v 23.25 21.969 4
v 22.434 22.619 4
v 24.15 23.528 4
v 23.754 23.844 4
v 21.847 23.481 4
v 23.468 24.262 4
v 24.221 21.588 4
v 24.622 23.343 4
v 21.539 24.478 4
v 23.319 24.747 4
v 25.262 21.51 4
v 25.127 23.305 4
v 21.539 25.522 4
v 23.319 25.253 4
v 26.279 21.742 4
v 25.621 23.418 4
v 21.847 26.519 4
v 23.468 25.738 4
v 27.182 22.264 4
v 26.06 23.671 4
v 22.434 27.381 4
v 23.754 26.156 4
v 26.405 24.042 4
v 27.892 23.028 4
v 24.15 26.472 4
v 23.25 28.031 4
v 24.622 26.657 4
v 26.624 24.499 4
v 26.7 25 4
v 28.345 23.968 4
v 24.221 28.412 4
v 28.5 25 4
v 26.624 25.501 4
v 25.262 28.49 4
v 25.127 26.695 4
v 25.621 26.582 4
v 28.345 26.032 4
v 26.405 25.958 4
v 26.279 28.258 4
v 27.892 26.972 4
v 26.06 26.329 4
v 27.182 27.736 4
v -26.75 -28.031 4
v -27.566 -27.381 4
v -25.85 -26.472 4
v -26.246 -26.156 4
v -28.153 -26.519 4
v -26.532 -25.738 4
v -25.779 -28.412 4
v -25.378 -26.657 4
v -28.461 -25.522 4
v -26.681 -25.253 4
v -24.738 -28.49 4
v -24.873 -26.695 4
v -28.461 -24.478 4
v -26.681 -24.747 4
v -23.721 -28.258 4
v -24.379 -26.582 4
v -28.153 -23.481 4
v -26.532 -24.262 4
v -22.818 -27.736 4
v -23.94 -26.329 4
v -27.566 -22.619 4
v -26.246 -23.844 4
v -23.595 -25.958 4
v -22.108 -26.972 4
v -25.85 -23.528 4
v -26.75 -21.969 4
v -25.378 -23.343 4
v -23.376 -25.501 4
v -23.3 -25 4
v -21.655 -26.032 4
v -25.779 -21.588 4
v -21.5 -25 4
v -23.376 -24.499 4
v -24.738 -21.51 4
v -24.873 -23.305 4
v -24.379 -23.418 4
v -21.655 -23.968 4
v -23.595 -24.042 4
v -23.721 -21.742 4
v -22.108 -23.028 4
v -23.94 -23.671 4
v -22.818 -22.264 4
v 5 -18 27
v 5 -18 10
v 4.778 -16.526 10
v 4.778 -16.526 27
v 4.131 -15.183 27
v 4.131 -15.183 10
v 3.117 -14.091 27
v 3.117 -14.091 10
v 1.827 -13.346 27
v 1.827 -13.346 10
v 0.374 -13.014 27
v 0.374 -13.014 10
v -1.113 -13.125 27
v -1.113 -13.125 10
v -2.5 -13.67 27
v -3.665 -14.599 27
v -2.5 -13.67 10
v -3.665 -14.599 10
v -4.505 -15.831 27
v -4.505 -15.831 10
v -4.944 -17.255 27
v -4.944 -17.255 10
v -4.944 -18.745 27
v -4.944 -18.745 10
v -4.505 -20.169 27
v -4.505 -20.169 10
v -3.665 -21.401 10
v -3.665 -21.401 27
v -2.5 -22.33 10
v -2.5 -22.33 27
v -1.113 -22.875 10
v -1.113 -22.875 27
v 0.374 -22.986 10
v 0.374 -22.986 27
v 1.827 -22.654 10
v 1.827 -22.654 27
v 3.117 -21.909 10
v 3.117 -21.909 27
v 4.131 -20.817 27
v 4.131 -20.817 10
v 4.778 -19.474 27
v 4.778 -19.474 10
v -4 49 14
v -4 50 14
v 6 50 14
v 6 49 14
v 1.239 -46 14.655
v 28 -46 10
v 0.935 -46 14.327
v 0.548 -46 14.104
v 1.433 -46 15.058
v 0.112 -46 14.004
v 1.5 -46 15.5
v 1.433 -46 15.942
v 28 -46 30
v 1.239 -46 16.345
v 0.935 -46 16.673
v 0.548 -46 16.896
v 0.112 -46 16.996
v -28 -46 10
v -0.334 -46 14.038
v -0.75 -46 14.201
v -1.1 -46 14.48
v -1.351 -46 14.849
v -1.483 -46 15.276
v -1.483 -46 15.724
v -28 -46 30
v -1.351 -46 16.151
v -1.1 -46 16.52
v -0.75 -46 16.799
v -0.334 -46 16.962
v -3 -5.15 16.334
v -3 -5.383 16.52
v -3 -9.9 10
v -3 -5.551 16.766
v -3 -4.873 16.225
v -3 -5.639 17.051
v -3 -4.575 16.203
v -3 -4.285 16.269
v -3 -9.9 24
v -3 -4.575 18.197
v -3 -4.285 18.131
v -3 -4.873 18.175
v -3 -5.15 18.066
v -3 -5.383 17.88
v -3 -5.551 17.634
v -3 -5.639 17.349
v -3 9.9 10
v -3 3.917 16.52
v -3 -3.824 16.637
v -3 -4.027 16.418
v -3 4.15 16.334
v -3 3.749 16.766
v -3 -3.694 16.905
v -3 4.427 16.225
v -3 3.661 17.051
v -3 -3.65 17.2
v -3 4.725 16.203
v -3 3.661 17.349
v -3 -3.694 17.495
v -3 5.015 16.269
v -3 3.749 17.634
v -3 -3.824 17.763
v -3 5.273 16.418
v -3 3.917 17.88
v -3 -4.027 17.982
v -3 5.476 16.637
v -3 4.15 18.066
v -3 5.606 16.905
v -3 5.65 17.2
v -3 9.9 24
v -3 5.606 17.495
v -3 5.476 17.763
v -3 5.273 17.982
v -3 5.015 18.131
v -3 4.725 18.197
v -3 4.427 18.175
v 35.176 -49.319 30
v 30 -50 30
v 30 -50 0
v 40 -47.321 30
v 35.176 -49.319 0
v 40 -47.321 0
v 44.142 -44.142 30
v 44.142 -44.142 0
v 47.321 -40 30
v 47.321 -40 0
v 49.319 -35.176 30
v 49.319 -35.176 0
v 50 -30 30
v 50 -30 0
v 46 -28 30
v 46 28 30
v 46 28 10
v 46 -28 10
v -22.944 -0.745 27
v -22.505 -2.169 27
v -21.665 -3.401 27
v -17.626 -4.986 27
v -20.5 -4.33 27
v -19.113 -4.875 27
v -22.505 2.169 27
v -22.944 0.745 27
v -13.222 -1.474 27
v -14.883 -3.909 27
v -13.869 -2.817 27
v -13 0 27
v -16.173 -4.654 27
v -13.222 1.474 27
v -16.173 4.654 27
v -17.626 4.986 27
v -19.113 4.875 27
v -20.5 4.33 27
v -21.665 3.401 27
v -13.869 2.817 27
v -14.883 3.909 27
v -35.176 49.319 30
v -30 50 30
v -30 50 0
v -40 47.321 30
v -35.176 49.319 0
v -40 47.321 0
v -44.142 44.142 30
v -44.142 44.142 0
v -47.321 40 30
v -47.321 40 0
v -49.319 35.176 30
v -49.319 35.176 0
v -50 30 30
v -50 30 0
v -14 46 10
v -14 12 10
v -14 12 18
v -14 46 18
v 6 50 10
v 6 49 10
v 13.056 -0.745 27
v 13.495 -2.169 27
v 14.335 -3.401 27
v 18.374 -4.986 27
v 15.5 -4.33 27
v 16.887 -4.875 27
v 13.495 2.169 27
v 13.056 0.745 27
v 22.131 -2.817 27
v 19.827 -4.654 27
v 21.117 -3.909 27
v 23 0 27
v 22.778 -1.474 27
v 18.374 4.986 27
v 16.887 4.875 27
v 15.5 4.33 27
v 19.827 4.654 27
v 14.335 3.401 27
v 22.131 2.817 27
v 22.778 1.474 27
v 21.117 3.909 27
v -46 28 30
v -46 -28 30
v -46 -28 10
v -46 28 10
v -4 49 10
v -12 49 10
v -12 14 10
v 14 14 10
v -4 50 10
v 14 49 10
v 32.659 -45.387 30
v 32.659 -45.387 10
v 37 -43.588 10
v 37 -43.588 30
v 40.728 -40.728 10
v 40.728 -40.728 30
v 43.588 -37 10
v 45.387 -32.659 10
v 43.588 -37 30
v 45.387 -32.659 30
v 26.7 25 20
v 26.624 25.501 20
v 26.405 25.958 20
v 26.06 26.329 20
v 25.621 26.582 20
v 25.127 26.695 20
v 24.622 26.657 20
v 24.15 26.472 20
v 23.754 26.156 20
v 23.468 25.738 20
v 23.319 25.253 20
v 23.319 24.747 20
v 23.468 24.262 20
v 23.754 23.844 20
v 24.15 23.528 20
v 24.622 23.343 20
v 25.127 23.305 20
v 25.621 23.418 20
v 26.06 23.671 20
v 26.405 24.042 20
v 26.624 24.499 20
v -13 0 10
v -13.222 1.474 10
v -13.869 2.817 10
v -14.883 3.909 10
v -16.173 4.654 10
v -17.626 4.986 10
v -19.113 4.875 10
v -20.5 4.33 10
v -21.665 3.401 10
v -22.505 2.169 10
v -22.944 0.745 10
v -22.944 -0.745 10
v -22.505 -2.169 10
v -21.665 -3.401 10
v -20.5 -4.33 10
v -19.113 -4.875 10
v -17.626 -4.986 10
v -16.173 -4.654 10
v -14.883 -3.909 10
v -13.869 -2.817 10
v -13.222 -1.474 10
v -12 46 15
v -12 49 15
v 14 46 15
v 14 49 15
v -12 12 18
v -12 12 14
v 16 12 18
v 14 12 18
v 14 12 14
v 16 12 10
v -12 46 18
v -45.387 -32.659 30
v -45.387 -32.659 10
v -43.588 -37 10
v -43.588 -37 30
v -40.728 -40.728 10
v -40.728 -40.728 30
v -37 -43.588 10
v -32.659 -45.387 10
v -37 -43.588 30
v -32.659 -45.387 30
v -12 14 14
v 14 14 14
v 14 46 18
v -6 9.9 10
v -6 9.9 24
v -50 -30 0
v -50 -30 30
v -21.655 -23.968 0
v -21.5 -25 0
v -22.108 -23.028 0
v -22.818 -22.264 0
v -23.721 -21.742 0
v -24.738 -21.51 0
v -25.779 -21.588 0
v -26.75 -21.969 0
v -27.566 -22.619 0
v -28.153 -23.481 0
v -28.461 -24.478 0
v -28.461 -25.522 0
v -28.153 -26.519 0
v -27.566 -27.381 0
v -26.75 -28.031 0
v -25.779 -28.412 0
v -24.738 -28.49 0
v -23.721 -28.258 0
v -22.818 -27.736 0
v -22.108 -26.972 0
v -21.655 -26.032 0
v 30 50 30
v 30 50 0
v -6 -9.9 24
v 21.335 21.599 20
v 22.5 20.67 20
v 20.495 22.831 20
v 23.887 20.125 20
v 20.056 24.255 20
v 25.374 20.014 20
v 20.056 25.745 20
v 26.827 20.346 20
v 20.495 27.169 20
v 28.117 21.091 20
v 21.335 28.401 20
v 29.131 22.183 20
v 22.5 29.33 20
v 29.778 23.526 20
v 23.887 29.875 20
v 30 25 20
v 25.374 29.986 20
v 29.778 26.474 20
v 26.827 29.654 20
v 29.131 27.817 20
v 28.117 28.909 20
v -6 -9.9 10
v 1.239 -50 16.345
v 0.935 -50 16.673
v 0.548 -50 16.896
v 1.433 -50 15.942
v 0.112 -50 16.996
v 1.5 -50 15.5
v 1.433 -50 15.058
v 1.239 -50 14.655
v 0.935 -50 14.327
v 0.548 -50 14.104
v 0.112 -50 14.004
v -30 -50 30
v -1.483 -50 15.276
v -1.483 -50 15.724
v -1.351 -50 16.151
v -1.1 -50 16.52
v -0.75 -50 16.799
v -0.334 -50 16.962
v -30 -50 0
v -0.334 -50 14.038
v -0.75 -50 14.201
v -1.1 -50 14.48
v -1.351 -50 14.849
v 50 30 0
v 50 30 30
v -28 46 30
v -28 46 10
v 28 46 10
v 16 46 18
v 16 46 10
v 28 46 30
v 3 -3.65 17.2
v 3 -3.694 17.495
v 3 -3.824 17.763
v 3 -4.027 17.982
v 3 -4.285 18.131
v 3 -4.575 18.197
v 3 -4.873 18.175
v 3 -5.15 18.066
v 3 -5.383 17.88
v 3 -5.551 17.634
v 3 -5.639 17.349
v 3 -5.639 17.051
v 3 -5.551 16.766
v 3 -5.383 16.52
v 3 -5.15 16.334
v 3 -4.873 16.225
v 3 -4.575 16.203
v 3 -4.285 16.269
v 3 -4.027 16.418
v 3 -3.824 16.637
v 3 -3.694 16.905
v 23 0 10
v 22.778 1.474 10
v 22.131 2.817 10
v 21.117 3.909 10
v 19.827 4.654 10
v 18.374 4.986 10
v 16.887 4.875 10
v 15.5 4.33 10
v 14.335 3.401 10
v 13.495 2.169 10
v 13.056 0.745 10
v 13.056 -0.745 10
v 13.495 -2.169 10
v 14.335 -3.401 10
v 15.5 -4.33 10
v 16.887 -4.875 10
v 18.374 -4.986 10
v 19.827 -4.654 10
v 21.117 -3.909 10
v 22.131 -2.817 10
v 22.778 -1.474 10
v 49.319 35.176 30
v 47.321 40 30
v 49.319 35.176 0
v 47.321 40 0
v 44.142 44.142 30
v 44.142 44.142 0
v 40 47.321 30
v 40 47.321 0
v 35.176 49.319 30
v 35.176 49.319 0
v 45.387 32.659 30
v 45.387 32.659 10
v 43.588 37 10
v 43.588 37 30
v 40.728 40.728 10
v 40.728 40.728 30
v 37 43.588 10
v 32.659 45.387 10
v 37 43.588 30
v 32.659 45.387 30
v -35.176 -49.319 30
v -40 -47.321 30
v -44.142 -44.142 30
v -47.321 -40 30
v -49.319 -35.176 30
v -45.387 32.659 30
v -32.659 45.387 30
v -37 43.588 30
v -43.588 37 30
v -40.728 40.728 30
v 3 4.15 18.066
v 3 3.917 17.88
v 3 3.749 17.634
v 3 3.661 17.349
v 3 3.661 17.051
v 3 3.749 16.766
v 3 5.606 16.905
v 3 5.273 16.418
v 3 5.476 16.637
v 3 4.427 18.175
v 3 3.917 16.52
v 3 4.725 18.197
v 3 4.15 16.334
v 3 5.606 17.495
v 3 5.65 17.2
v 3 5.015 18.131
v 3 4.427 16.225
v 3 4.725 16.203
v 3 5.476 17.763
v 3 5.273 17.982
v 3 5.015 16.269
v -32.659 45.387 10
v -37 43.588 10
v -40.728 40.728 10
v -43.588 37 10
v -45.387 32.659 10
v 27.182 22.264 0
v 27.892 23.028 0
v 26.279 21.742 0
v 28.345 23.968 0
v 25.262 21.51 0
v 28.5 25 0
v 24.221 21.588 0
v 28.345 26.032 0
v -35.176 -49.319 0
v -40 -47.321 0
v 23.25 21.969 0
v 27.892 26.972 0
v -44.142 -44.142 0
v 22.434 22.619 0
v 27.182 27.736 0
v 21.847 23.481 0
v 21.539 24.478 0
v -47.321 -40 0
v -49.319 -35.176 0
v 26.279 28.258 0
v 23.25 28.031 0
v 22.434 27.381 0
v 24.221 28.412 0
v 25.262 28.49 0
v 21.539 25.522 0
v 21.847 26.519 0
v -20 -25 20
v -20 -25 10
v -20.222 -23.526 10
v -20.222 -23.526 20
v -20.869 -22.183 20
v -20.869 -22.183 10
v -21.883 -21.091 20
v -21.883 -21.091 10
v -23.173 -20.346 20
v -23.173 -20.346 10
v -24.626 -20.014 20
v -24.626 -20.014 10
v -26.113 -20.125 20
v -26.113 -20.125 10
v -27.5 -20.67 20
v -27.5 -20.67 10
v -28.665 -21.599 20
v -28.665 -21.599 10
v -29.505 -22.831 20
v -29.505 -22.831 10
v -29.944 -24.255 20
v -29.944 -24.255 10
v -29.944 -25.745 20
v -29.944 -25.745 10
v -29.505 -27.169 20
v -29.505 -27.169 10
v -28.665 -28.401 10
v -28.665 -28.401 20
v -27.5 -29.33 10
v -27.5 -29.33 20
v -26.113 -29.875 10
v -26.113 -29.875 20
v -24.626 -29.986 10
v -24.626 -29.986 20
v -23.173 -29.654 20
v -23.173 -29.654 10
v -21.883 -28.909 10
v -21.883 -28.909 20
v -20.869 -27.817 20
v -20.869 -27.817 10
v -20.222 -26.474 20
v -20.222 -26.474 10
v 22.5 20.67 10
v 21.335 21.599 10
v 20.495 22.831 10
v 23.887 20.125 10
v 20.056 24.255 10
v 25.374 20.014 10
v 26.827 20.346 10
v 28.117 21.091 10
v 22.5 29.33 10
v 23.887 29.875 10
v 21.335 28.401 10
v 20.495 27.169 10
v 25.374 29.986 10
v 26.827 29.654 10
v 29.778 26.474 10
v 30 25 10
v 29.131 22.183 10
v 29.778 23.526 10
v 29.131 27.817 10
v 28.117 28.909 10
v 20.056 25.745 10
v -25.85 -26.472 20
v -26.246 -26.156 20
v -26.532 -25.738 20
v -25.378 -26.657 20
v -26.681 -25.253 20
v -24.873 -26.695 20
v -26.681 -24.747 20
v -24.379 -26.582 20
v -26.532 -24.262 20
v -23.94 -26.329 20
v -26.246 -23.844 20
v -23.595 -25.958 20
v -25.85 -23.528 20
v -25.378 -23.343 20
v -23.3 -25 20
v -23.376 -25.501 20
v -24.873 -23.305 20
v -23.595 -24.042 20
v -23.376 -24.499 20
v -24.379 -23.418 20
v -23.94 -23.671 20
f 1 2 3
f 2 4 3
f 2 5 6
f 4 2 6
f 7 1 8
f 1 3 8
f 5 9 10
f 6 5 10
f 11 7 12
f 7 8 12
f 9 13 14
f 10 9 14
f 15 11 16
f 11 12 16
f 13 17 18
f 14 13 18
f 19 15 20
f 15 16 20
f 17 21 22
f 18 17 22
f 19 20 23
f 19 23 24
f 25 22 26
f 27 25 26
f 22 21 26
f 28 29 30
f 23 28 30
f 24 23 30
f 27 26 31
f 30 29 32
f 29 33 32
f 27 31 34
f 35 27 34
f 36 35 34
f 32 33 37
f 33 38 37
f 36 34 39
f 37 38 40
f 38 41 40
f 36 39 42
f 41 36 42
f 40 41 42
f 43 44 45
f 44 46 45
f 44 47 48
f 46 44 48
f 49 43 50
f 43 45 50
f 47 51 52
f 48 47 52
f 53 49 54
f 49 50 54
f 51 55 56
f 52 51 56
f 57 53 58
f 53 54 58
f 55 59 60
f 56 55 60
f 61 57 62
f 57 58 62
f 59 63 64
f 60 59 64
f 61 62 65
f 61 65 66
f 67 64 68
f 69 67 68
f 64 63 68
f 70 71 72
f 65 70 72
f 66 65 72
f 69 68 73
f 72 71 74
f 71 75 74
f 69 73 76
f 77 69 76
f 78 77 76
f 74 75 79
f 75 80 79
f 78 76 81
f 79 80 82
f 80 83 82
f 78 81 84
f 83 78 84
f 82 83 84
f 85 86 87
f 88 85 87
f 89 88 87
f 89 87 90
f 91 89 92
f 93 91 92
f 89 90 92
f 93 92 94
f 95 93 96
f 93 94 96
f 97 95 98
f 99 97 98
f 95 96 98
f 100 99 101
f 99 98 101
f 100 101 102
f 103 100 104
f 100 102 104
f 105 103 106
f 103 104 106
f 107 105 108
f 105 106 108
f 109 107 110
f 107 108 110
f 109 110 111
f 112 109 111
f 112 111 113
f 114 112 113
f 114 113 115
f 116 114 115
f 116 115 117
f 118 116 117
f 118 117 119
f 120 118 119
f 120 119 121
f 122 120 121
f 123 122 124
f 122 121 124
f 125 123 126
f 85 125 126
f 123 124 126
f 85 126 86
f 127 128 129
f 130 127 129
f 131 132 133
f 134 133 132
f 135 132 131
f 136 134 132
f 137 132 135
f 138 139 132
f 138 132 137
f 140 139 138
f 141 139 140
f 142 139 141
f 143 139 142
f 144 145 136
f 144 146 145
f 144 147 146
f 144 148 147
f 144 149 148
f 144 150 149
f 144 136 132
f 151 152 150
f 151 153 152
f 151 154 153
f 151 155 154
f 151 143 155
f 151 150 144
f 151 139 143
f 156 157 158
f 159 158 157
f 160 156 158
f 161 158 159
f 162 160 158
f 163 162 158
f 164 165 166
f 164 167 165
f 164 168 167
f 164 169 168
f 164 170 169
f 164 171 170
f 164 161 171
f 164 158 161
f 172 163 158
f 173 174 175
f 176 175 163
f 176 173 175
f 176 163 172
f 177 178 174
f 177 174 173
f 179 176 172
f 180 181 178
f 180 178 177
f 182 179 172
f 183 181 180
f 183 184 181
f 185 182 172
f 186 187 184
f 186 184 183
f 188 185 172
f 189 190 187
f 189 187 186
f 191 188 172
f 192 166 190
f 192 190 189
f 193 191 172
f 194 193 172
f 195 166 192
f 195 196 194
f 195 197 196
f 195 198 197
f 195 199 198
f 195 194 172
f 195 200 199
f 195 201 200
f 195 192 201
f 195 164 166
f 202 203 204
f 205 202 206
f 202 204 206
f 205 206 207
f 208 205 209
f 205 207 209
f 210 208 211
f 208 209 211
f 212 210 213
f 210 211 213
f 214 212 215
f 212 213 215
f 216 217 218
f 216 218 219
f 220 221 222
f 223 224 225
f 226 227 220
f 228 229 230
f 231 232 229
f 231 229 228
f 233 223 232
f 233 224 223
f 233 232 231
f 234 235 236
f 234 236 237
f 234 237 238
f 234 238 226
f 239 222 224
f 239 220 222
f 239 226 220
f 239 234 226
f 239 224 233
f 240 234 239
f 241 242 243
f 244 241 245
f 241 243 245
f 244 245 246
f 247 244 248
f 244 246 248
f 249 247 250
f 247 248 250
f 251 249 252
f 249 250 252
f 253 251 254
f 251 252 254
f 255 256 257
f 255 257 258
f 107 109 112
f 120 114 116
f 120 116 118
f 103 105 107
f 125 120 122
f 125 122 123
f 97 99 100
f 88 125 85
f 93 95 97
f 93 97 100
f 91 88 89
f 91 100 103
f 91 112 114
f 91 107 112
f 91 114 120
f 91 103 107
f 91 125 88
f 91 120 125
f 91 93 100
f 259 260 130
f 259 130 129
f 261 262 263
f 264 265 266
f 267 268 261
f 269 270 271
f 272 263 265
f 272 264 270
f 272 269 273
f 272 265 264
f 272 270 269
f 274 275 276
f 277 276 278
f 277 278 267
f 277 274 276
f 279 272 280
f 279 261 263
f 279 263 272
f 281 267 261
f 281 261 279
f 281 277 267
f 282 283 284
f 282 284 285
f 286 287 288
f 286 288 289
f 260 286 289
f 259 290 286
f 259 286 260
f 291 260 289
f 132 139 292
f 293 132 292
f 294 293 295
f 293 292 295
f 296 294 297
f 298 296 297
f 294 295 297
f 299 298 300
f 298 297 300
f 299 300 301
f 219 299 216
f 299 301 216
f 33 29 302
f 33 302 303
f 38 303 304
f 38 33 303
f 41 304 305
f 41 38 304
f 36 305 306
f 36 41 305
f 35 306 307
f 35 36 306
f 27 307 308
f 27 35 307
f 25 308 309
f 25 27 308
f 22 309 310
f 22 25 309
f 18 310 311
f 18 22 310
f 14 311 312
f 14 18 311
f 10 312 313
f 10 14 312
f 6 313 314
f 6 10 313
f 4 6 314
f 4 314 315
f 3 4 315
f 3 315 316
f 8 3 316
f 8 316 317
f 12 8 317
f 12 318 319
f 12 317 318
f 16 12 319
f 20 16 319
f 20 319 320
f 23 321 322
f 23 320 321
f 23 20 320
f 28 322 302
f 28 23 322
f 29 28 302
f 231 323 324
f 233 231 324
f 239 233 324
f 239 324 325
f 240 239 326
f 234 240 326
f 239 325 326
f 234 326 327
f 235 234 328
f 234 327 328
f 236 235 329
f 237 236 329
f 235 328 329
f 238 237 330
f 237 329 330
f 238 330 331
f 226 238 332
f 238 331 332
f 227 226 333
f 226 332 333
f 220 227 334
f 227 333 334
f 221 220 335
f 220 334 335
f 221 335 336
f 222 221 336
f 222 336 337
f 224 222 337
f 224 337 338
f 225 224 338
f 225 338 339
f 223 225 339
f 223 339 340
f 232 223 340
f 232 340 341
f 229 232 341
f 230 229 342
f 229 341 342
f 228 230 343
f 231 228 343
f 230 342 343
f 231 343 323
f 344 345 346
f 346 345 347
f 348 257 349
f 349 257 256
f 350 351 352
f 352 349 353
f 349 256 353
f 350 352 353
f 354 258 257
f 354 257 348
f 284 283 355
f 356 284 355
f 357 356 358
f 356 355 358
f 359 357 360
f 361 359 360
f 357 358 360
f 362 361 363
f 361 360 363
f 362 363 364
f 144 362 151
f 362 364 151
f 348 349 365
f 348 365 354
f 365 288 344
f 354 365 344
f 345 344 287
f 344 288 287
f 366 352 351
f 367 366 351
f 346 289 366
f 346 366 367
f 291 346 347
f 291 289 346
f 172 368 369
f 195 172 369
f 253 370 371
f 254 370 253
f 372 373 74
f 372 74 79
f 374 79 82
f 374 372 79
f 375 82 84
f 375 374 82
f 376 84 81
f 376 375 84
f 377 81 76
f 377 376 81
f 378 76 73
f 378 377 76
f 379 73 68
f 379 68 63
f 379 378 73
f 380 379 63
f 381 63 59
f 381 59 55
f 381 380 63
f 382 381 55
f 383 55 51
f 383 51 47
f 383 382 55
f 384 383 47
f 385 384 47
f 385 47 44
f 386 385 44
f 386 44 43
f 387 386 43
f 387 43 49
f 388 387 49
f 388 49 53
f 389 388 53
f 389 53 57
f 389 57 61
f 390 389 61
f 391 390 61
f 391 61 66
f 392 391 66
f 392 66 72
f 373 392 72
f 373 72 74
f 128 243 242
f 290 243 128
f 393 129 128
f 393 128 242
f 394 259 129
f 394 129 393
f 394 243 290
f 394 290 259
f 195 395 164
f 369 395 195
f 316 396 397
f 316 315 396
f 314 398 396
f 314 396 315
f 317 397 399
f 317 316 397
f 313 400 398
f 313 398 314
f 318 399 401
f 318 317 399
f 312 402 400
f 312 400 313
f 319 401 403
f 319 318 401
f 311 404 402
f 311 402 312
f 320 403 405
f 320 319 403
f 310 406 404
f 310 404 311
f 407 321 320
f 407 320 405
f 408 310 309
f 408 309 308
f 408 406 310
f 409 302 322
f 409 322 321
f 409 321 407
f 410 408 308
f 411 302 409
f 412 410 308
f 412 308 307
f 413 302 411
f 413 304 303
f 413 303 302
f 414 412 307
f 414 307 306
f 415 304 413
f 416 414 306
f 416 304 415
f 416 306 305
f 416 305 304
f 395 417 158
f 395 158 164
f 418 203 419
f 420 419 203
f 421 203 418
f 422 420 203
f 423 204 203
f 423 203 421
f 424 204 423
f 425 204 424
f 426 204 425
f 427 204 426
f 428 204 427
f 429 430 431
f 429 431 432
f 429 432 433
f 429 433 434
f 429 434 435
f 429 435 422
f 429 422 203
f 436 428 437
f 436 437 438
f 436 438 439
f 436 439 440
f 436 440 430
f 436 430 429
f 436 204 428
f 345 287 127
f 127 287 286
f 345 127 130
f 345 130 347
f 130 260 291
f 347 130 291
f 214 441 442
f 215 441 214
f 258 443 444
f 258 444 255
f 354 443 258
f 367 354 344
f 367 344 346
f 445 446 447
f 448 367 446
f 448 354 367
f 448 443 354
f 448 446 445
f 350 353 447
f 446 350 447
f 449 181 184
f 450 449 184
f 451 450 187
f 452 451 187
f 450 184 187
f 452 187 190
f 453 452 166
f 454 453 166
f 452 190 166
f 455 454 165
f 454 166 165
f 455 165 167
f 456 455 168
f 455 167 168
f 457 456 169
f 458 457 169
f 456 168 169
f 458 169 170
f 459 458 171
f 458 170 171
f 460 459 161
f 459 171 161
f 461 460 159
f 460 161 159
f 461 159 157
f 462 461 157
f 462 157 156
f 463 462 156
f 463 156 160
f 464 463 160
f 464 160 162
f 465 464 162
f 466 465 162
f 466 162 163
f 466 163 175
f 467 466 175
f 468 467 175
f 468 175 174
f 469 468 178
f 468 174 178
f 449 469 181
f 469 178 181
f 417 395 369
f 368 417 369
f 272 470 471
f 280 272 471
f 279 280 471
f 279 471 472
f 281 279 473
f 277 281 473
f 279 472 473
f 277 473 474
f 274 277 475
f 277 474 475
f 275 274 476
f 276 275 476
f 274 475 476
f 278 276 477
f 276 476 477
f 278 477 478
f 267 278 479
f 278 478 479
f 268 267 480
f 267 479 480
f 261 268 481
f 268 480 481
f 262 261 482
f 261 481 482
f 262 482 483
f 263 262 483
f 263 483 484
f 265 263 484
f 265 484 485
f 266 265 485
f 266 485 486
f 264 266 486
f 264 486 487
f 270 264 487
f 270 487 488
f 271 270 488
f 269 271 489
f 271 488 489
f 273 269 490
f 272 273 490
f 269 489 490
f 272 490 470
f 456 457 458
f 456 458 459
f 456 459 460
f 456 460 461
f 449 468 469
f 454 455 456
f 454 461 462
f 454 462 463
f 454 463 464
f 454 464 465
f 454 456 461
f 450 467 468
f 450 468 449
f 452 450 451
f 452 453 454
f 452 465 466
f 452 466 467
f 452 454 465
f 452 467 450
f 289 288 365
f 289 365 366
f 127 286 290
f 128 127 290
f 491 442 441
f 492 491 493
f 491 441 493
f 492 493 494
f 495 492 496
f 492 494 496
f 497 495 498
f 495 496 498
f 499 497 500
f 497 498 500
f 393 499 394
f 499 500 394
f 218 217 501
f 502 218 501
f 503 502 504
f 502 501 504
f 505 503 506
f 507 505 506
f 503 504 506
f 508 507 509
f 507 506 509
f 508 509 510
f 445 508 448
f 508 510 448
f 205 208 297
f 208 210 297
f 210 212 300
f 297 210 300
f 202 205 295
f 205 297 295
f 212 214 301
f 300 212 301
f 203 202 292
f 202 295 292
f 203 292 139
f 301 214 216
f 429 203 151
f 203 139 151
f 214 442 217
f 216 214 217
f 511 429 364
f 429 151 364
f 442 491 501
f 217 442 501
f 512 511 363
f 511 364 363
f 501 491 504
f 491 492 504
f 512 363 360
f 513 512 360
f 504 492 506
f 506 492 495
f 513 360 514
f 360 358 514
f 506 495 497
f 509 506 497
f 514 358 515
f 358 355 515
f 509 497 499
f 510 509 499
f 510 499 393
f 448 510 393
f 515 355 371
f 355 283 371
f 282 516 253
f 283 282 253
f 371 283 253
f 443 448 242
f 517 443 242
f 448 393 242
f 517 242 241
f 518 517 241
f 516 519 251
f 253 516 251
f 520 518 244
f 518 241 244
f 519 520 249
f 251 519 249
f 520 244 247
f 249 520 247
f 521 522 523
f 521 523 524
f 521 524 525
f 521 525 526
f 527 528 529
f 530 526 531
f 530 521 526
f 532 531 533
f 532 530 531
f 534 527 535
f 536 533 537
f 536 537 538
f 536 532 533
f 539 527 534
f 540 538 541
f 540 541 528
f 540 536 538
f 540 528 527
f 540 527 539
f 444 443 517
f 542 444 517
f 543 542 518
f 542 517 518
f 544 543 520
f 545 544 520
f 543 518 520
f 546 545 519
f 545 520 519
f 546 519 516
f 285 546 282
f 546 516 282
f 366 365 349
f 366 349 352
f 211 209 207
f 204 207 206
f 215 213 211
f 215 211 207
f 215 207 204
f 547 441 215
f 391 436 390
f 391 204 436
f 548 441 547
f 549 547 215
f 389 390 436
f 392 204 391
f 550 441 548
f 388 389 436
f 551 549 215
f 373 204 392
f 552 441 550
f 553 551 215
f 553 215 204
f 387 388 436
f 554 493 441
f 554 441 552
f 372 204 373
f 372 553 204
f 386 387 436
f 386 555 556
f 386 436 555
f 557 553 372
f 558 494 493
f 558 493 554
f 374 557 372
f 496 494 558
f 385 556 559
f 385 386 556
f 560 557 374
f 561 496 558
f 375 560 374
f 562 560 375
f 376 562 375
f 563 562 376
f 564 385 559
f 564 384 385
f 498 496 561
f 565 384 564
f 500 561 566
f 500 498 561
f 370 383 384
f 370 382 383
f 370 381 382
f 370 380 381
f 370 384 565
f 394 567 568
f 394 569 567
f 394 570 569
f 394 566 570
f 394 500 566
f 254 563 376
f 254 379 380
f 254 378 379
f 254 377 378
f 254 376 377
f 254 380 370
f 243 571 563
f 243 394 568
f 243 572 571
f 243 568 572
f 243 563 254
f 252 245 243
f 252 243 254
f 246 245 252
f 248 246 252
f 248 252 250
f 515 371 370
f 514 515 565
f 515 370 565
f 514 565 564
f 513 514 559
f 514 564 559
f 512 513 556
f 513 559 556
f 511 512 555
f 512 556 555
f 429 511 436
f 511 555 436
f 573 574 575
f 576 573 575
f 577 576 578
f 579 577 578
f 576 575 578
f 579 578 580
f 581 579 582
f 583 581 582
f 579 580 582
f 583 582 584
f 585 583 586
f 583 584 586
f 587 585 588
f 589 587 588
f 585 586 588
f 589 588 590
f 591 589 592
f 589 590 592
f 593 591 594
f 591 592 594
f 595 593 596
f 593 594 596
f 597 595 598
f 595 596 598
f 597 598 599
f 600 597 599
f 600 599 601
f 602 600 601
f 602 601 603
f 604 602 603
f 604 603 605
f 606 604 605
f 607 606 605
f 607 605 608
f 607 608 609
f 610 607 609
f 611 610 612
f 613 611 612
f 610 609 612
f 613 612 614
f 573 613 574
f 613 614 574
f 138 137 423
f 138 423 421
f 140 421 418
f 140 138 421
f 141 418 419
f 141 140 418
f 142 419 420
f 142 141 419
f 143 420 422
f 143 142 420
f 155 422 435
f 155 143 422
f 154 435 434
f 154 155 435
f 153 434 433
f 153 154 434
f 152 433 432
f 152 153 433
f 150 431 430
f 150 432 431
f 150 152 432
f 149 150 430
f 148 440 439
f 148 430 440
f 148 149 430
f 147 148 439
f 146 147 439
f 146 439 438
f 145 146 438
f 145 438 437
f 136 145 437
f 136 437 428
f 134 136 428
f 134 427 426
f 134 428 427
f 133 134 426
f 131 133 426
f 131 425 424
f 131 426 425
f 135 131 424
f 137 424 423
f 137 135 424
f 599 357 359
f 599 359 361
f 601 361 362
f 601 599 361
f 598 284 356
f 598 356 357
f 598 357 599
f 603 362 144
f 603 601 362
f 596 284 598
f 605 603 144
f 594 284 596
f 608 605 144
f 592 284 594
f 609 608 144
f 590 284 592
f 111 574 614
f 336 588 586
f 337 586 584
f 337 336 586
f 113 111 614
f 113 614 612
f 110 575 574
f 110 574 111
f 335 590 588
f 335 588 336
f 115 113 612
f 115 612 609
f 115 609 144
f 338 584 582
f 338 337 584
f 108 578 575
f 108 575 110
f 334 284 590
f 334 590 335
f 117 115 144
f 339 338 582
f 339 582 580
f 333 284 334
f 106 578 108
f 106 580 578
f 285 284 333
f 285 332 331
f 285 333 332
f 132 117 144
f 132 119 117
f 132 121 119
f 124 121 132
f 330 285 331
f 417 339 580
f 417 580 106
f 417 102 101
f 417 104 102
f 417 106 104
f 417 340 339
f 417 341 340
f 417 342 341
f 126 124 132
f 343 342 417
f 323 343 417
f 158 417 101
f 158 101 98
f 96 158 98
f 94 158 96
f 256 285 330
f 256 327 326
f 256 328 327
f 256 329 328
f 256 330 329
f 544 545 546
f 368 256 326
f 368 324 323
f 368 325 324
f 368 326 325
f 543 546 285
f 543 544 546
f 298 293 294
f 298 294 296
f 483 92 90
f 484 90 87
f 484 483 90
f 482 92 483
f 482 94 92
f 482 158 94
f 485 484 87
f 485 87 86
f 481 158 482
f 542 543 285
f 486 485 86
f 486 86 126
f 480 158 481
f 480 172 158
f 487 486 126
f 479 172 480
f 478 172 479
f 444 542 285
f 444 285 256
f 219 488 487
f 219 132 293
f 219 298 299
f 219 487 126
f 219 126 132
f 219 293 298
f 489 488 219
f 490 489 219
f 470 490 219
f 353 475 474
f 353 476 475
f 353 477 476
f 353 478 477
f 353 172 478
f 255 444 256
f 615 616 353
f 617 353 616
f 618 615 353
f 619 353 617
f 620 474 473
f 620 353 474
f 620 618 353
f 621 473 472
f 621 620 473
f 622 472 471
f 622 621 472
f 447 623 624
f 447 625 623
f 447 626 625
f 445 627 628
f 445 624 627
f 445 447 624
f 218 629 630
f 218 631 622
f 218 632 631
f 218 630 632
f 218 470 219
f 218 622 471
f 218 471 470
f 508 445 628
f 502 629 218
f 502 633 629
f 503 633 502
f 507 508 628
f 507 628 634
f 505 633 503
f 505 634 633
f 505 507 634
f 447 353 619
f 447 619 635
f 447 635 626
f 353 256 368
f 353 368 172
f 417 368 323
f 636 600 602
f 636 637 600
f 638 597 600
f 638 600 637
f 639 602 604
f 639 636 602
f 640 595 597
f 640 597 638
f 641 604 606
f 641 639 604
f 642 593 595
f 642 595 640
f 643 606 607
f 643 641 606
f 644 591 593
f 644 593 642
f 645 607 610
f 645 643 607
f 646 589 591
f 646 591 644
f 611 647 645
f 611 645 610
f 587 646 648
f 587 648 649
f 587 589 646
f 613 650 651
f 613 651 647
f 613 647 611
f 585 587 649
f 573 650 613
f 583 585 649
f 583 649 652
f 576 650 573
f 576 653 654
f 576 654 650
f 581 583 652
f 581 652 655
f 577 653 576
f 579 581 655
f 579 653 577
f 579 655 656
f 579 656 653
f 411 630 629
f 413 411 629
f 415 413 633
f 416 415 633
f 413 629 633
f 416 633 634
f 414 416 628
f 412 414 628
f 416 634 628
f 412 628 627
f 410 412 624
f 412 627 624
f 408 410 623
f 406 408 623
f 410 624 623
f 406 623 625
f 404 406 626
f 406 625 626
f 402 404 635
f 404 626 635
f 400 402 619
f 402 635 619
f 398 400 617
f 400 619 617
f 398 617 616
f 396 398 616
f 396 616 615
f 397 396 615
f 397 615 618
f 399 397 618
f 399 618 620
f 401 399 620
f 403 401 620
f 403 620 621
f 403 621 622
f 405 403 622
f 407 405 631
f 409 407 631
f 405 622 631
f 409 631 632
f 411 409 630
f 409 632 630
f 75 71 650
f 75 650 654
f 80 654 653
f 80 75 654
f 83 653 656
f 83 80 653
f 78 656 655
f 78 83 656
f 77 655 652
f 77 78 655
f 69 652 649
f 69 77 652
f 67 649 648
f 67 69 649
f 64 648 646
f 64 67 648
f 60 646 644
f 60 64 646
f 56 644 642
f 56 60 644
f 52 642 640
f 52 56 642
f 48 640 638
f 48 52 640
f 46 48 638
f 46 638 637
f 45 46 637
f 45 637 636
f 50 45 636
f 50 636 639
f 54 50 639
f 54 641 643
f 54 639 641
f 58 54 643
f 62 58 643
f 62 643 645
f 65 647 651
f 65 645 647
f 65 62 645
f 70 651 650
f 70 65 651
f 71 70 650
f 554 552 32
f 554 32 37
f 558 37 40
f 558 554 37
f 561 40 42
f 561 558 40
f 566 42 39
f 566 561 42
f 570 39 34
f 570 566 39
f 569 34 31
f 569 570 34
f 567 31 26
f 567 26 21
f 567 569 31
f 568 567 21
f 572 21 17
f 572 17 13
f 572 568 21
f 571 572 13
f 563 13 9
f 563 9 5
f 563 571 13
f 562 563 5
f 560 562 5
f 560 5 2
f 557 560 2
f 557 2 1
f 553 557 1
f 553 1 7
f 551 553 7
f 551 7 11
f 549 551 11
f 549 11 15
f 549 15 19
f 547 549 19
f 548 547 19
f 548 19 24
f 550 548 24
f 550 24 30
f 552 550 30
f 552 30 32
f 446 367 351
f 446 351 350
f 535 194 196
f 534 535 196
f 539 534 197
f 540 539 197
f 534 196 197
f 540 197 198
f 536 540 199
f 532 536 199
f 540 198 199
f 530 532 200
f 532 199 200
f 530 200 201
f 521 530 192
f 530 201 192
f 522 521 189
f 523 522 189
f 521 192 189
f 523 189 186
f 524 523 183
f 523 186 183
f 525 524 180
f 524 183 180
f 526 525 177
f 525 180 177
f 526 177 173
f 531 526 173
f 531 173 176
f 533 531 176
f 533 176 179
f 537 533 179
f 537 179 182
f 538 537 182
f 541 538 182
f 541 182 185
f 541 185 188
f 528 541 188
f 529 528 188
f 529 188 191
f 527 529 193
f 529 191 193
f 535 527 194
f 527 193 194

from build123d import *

# Parameters (mm, degrees)
CYLINDER009_R     = 1.5
CYLINDER009_DEPTH = 10
CYLINDER008_R     = 3.5
CYLINDER008_DEPTH = 8
CYLINDER006_R     = 1.7
CYLINDER006_DEPTH = 36
CYLINDER007_R     = 3.5
CYLINDER007_DEPTH = 8
CYLINDER005_R     = 1.7
CYLINDER005_DEPTH = 36
CYLINDER004_R     = 5
CYLINDER004_DEPTH = 10
CYLINDER003_R     = 5
CYLINDER003_DEPTH = 10
SKETCH002_W       = 19.8
SKETCH002_H       = 14
PAD001_DEPTH      = 3
SKETCH003_R       = 1
PAD002_DEPTH      = 6
CYLINDER_R        = 5
CYLINDER_DEPTH    = 17
CYLINDER001_R     = 5
CYLINDER001_DEPTH = 17
CYLINDER002_R     = 5
CYLINDER002_DEPTH = 17
BOX_W             = 2
BOX_H             = 34
BOX_DEPTH         = 10
BOX001_W          = 2
BOX001_H          = 34
BOX001_DEPTH      = 10
BOX004_W          = 30
BOX004_H          = 2
BOX004_DEPTH      = 6
BOX003_W          = 26
BOX003_H          = 10
BOX003_DEPTH      = 5
BOX002_W          = 10
BOX002_H          = 10
BOX002_DEPTH      = 4
PAD_DEPTH         = 30
POCKET_DEPTH      = 20


with BuildPart() as taladro_led:
    # Cylinder009 → Cylinder009 (new body)
    with BuildSketch(Plane(origin=(0, -44, 15.5), x_dir=(1, 0, 0), z_dir=(0, -1, 0))):
        Circle(CYLINDER009_R)
    extrude(amount=CYLINDER009_DEPTH)


with BuildPart() as cylinder008:
    # Cylinder008 → Cylinder008 (new body)
    with BuildSketch(Plane(origin=(25, 25, -4), x_dir=(1, 0, 0), z_dir=(0, 0, 1))):
        Circle(CYLINDER008_R)
    extrude(amount=CYLINDER008_DEPTH)


with BuildPart() as fusion002:
    # Cylinder006 → Cylinder006 (new body)
    with BuildSketch(Plane(origin=(25, 25, -4), x_dir=(1, 0, 0), z_dir=(0, 0, 1))):
        Circle(CYLINDER006_R)
    extrude(amount=CYLINDER006_DEPTH)

    # Fusion002: union Cylinder008
    add(cylinder008.part)


with BuildPart() as cylinder007:
    # Cylinder007 → Cylinder007 (new body)
    with BuildSketch(Plane(origin=(-25, -25, -4), x_dir=(1, 0, 0), z_dir=(0, 0, 1))):
        Circle(CYLINDER007_R)
    extrude(amount=CYLINDER007_DEPTH)


with BuildPart() as fusion001:
    # Cylinder005 → Cylinder005 (new body)
    with BuildSketch(Plane(origin=(-25, -25, -4), x_dir=(1, 0, 0), z_dir=(0, 0, 1))):
        Circle(CYLINDER005_R)
    extrude(amount=CYLINDER005_DEPTH)

    # Fusion001: union Cylinder007
    add(cylinder007.part)


with BuildPart() as cylinder004:
    # Cylinder004 → Cylinder004 (new body)
    with BuildSketch(Plane(origin=(25, 25, 10), x_dir=(1, 0, 0), z_dir=(0, 0, 1))):
        Circle(CYLINDER004_R)
    extrude(amount=CYLINDER004_DEPTH)


with BuildPart() as cylinder003:
    # Cylinder003 → Cylinder003 (new body)
    with BuildSketch(Plane(origin=(-25, -25, 10), x_dir=(1, 0, 0), z_dir=(0, 0, 1))):
        Circle(CYLINDER003_R)
    extrude(amount=CYLINDER003_DEPTH)


with BuildPart() as soporte_fin_de_carrera:
    # Sketch002 → Pad001 (new body)
    with BuildSketch(Plane.YZ):
        with Locations((0, 7)):
            Rectangle(SKETCH002_W, SKETCH002_H)
    extrude(amount=PAD001_DEPTH)

    # Sketch003 (on Face6 of Pad001) → Pad002 (join)
    with BuildSketch(Plane.YZ.offset(3)):
        with Locations((-4.65, 7.2)):
            Circle(SKETCH003_R)
        with Locations((4.65, 7.2)):
            Circle(SKETCH003_R)
    extrude(amount=PAD002_DEPTH)


with BuildPart() as soporte_fin_de_carrera_1:
    # Body002 placement: moved
    add(soporte_fin_de_carrera.part.moved(Location((-6, 0, 10))))


with BuildPart() as cylinder:
    # Cylinder → Cylinder (new body)
    with BuildSketch(Plane(origin=(-18, 0, 10), x_dir=(1, 0, 0), z_dir=(0, 0, 1))):
        Circle(CYLINDER_R)
    extrude(amount=CYLINDER_DEPTH)


with BuildPart() as cylinder001:
    # Cylinder001 → Cylinder001 (new body)
    with BuildSketch(Plane(origin=(18, 0, 10), x_dir=(1, 0, 0), z_dir=(0, 0, 1))):
        Circle(CYLINDER001_R)
    extrude(amount=CYLINDER001_DEPTH)


with BuildPart() as cylinder002:
    # Cylinder002 → Cylinder002 (new body)
    with BuildSketch(Plane(origin=(0, -18, 10), x_dir=(1, 0, 0), z_dir=(0, 0, 1))):
        Circle(CYLINDER002_R)
    extrude(amount=CYLINDER002_DEPTH)


with BuildPart() as box:
    # Box → Box (new body)
    with BuildSketch(Plane(origin=(-14, 12, 8), x_dir=(1, 0, 0), z_dir=(0, 0, 1))):
        with Locations((1, 17)):
            Rectangle(BOX_W, BOX_H)
    extrude(amount=BOX_DEPTH)


with BuildPart() as box001:
    # Box001 → Box001 (new body)
    with BuildSketch(Plane(origin=(14, 12, 8), x_dir=(1, 0, 0), z_dir=(0, 0, 1))):
        with Locations((1, 17)):
            Rectangle(BOX001_W, BOX001_H)
    extrude(amount=BOX001_DEPTH)


with BuildPart() as box004:
    # Box004 → Box004 (new body)
    with BuildSketch(Plane(origin=(-14, 12, 8), x_dir=(1, 0, 0), z_dir=(0, 0, 1))):
        with Locations((15, 1)):
            Rectangle(BOX004_W, BOX004_H)
    extrude(amount=BOX004_DEPTH)


with BuildPart() as cajeado_borde_caja:
    # Box003 → Box003 (new body)
    with BuildSketch(Plane(origin=(-12, 39, 10), x_dir=(1, 0, 0), z_dir=(0, 0, 1))):
        with Locations((13, 5)):
            Rectangle(BOX003_W, BOX003_H)
    extrude(amount=BOX003_DEPTH)


with BuildPart() as fusion:
    # Box002 → Box002 (new body)
    with BuildSketch(Plane(origin=(-4, 41, 10), x_dir=(1, 0, 0), z_dir=(0, 0, 1))):
        with Locations((5, 5)):
            Rectangle(BOX002_W, BOX002_H)
    extrude(amount=BOX002_DEPTH)

    # Fusion: union Cajeado borde caja
    add(cajeado_borde_caja.part)


with BuildPart() as cut003:
    # Sketch → Pad (new body)
    with BuildSketch(Plane.XY):
        with BuildLine():
            Line((-30, 50), (30, 50))
            ThreePointArc((50, 30), (44.142136, 44.142136), (30, 50))
            Line((50, 30), (50, -30))
            ThreePointArc((30, -50), (44.142136, -44.142136), (50, -30))
            Line((30, -50), (-30, -50))
            ThreePointArc((-50, -30), (-44.142136, -44.142136), (-30, -50))
            Line((-50, -30), (-50, 30))
            ThreePointArc((-30, 50), (-44.142136, 44.142136), (-50, 30))
        make_face()
    extrude(amount=PAD_DEPTH)

    # Sketch001 (on Face10 of Pad) → Pocket (cut)
    with BuildSketch(Plane.XY.offset(30)):
        with BuildLine():
            Line((-28, 46), (28, 46))
            ThreePointArc((46, 28), (40.727922, 40.727922), (28, 46))
            Line((46, 28), (46, -28))
            ThreePointArc((28, -46), (40.727922, -40.727922), (46, -28))
            Line((28, -46), (-28, -46))
            ThreePointArc((-46, -28), (-40.727922, -40.727922), (-28, -46))
            Line((-46, -28), (-46, 28))
            ThreePointArc((-28, 46), (-40.727922, 40.727922), (-46, 28))
        make_face()
    extrude(amount=-POCKET_DEPTH, mode=Mode.SUBTRACT)

    # Cut: cut Fusion
    add(fusion.part, mode=Mode.SUBTRACT)

    # Fusion003: union Cylinder004, Cylinder003, Soporte fin de carrera, Cylinder, Cylinder001, Cylinder002, Box, Box001, Box004
    add(cylinder004.part)
    add(cylinder003.part)
    add(soporte_fin_de_carrera_1.part)
    add(cylinder.part)
    add(cylinder001.part)
    add(cylinder002.part)
    add(box.part)
    add(box001.part)
    add(box004.part)

    # Cut001: cut Fusion001
    add(fusion001.part, mode=Mode.SUBTRACT)

    # Cut002: cut Fusion002
    add(fusion002.part, mode=Mode.SUBTRACT)

    # Cut003: cut Taladro LED
    add(taladro_led.part, mode=Mode.SUBTRACT)


solid = cut003.part
